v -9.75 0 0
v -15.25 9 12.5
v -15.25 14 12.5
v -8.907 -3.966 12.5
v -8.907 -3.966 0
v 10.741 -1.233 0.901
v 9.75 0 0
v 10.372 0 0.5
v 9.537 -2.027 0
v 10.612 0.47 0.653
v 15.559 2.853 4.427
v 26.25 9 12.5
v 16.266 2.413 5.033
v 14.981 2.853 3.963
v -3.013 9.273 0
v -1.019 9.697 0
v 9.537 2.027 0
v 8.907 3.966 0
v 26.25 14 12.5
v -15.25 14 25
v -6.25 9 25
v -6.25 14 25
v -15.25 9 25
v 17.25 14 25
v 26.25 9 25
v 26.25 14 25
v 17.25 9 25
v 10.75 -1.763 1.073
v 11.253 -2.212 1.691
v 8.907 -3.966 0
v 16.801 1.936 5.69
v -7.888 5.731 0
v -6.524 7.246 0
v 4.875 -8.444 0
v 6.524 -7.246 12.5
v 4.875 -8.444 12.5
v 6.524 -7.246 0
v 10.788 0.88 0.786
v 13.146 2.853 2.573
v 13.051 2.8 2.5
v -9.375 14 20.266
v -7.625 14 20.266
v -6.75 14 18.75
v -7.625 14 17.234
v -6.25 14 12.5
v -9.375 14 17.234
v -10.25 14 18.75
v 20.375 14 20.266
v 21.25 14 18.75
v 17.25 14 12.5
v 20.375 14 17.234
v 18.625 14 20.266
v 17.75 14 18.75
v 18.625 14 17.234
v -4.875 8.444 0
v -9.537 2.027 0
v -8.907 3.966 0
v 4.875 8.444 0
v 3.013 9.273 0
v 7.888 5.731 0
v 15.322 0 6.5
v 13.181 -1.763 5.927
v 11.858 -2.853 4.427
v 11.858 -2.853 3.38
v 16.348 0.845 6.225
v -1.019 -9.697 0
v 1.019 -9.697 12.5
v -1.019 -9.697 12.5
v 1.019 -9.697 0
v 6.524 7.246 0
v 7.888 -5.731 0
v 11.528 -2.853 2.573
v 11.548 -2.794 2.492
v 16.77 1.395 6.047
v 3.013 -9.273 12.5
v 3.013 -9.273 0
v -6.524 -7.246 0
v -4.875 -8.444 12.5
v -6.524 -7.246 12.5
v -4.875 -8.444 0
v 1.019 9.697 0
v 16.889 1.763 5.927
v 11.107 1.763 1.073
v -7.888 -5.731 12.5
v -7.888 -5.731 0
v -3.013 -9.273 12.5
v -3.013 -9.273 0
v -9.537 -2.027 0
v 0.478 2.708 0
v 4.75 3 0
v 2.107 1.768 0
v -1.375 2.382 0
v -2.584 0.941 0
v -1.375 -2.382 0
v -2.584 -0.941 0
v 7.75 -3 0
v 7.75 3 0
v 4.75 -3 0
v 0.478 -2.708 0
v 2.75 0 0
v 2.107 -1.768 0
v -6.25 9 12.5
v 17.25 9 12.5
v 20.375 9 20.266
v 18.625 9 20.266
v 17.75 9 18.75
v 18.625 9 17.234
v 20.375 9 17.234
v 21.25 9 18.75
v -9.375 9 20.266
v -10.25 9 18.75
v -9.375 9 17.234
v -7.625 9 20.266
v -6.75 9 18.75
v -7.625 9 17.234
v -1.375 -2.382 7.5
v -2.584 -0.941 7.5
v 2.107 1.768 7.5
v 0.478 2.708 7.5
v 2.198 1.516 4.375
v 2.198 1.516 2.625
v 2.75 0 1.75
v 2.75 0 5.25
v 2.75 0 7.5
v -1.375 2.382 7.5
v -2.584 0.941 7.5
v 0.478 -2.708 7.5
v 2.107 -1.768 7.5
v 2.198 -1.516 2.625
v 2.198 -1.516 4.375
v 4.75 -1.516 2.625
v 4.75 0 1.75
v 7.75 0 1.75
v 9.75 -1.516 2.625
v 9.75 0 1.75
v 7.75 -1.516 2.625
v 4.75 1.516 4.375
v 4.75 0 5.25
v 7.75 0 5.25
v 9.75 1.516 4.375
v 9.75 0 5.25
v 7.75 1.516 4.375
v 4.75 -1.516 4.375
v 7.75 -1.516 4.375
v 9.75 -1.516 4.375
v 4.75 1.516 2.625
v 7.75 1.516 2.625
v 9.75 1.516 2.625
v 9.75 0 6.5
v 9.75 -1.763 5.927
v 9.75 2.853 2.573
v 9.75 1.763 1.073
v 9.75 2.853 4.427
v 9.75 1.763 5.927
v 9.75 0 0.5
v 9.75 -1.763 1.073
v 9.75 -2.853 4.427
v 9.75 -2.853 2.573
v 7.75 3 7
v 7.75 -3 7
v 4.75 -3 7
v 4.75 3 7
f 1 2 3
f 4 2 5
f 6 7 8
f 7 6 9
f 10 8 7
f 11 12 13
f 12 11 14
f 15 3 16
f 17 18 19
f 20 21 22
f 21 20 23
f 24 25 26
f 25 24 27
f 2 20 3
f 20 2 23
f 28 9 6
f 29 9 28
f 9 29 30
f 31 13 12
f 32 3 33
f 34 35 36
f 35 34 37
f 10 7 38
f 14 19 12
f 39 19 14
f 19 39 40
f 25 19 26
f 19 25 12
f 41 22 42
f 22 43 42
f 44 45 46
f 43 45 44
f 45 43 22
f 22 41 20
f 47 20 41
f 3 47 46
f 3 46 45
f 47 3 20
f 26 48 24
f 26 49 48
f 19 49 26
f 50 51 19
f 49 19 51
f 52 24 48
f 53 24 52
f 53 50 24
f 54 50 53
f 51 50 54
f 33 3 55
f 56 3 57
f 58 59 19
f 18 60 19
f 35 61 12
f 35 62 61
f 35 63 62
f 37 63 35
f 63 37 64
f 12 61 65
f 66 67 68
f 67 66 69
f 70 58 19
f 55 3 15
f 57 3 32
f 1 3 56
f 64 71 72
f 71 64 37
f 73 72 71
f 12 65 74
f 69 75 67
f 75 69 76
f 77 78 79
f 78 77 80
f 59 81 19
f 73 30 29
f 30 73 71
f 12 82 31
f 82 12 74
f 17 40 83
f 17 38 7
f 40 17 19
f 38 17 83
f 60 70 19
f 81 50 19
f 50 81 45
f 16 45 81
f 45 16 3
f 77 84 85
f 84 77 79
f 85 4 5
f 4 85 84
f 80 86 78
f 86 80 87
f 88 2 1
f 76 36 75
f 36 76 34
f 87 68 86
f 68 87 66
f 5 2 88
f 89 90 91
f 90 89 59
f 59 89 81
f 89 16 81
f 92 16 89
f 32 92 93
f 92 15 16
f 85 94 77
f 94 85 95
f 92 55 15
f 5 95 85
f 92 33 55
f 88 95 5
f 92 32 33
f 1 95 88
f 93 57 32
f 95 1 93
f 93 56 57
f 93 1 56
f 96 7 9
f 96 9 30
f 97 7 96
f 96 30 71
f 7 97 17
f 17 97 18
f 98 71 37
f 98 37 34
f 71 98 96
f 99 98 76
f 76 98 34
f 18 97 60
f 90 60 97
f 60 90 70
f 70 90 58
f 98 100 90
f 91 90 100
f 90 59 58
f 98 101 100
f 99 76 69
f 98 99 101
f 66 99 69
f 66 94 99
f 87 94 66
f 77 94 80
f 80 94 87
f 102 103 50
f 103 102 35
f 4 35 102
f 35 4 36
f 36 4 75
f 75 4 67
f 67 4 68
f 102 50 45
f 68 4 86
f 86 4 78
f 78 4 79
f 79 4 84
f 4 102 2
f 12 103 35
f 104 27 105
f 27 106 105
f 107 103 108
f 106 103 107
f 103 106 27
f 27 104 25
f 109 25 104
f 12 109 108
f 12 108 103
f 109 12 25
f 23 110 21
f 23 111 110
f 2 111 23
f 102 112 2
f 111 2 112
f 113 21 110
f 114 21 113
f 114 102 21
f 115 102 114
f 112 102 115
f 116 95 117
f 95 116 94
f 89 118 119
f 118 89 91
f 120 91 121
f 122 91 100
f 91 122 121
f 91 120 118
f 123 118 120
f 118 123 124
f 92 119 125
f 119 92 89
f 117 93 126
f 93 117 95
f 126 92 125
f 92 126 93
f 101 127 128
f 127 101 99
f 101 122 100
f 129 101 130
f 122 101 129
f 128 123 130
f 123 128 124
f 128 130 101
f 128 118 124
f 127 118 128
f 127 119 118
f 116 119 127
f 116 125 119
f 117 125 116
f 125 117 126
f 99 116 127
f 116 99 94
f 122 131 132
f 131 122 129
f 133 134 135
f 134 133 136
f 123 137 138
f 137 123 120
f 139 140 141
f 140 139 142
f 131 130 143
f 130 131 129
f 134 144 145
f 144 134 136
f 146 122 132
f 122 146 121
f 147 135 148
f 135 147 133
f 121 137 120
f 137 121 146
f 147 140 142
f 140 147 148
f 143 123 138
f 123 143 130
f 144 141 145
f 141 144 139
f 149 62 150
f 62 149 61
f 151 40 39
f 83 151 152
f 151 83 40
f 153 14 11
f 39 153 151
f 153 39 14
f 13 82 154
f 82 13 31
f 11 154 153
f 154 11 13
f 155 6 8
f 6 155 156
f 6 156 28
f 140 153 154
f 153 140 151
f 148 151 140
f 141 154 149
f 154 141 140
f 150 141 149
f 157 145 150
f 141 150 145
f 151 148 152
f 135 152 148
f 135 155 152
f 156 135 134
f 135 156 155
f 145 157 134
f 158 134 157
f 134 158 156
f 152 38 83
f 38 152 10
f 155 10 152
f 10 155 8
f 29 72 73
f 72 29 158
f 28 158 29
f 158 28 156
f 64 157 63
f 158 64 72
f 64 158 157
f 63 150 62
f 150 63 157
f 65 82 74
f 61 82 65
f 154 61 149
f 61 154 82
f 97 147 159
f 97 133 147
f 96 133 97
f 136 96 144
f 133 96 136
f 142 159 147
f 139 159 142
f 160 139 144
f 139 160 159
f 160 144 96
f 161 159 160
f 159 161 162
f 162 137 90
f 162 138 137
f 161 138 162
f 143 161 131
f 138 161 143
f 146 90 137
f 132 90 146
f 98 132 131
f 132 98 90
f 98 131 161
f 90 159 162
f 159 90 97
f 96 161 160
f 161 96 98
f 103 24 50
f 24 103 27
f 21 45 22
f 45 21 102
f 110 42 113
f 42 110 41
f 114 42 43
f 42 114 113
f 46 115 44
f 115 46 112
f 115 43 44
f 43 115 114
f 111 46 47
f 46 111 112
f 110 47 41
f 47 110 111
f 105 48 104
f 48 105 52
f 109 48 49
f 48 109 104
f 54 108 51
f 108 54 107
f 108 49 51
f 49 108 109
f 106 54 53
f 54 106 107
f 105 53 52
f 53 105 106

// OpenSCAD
// Uncomment before final render
//$fa = 0.01;
//$fs = 0.25;

module cAxisServoMount() {
  difference() {
    hull() {
      cylinder(12.5, 9.75, 9.75);
      translate([-15.25, 9, 12.5]) {
        cube([41.5, 5, 12.5]);
      }
    }
    translate([-16.25, -14, 12.5]) {
      cube([43.5, 23, 13.5]);
    }
    translate([0, 0, -1]) {
      cylinder(8.5, 2.75, 2.75);
    }
    translate([0, 0, 3.5]) {
      rotate([0, 90, 0]) {
        cylinder(17.75, 1.75, 1.75);
      }
    }
    translate([9.75, 0, 3.5]) {
      rotate([0, 90, 0]) {
        cylinder(8, 3, 3);
      }
    }
    translate([4.75, -3, -1]) {
      cube([3, 6, 8]);
    }
    translate([-6.25, 8, 12.5]) {
      cube([23.5, 7, 13.5]);
    }
    translate([-8.5, 8, 18.75]) {
      rotate([-90, 0, 0]) {
        cylinder(7, 1.75, 1.75);
      }
    }
    translate([19.5, 8, 18.75]) {
      rotate([-90, 0, 0]) {
        cylinder(7, 1.75, 1.75);
      }
    }
  }
}

cAxisServoMount();
